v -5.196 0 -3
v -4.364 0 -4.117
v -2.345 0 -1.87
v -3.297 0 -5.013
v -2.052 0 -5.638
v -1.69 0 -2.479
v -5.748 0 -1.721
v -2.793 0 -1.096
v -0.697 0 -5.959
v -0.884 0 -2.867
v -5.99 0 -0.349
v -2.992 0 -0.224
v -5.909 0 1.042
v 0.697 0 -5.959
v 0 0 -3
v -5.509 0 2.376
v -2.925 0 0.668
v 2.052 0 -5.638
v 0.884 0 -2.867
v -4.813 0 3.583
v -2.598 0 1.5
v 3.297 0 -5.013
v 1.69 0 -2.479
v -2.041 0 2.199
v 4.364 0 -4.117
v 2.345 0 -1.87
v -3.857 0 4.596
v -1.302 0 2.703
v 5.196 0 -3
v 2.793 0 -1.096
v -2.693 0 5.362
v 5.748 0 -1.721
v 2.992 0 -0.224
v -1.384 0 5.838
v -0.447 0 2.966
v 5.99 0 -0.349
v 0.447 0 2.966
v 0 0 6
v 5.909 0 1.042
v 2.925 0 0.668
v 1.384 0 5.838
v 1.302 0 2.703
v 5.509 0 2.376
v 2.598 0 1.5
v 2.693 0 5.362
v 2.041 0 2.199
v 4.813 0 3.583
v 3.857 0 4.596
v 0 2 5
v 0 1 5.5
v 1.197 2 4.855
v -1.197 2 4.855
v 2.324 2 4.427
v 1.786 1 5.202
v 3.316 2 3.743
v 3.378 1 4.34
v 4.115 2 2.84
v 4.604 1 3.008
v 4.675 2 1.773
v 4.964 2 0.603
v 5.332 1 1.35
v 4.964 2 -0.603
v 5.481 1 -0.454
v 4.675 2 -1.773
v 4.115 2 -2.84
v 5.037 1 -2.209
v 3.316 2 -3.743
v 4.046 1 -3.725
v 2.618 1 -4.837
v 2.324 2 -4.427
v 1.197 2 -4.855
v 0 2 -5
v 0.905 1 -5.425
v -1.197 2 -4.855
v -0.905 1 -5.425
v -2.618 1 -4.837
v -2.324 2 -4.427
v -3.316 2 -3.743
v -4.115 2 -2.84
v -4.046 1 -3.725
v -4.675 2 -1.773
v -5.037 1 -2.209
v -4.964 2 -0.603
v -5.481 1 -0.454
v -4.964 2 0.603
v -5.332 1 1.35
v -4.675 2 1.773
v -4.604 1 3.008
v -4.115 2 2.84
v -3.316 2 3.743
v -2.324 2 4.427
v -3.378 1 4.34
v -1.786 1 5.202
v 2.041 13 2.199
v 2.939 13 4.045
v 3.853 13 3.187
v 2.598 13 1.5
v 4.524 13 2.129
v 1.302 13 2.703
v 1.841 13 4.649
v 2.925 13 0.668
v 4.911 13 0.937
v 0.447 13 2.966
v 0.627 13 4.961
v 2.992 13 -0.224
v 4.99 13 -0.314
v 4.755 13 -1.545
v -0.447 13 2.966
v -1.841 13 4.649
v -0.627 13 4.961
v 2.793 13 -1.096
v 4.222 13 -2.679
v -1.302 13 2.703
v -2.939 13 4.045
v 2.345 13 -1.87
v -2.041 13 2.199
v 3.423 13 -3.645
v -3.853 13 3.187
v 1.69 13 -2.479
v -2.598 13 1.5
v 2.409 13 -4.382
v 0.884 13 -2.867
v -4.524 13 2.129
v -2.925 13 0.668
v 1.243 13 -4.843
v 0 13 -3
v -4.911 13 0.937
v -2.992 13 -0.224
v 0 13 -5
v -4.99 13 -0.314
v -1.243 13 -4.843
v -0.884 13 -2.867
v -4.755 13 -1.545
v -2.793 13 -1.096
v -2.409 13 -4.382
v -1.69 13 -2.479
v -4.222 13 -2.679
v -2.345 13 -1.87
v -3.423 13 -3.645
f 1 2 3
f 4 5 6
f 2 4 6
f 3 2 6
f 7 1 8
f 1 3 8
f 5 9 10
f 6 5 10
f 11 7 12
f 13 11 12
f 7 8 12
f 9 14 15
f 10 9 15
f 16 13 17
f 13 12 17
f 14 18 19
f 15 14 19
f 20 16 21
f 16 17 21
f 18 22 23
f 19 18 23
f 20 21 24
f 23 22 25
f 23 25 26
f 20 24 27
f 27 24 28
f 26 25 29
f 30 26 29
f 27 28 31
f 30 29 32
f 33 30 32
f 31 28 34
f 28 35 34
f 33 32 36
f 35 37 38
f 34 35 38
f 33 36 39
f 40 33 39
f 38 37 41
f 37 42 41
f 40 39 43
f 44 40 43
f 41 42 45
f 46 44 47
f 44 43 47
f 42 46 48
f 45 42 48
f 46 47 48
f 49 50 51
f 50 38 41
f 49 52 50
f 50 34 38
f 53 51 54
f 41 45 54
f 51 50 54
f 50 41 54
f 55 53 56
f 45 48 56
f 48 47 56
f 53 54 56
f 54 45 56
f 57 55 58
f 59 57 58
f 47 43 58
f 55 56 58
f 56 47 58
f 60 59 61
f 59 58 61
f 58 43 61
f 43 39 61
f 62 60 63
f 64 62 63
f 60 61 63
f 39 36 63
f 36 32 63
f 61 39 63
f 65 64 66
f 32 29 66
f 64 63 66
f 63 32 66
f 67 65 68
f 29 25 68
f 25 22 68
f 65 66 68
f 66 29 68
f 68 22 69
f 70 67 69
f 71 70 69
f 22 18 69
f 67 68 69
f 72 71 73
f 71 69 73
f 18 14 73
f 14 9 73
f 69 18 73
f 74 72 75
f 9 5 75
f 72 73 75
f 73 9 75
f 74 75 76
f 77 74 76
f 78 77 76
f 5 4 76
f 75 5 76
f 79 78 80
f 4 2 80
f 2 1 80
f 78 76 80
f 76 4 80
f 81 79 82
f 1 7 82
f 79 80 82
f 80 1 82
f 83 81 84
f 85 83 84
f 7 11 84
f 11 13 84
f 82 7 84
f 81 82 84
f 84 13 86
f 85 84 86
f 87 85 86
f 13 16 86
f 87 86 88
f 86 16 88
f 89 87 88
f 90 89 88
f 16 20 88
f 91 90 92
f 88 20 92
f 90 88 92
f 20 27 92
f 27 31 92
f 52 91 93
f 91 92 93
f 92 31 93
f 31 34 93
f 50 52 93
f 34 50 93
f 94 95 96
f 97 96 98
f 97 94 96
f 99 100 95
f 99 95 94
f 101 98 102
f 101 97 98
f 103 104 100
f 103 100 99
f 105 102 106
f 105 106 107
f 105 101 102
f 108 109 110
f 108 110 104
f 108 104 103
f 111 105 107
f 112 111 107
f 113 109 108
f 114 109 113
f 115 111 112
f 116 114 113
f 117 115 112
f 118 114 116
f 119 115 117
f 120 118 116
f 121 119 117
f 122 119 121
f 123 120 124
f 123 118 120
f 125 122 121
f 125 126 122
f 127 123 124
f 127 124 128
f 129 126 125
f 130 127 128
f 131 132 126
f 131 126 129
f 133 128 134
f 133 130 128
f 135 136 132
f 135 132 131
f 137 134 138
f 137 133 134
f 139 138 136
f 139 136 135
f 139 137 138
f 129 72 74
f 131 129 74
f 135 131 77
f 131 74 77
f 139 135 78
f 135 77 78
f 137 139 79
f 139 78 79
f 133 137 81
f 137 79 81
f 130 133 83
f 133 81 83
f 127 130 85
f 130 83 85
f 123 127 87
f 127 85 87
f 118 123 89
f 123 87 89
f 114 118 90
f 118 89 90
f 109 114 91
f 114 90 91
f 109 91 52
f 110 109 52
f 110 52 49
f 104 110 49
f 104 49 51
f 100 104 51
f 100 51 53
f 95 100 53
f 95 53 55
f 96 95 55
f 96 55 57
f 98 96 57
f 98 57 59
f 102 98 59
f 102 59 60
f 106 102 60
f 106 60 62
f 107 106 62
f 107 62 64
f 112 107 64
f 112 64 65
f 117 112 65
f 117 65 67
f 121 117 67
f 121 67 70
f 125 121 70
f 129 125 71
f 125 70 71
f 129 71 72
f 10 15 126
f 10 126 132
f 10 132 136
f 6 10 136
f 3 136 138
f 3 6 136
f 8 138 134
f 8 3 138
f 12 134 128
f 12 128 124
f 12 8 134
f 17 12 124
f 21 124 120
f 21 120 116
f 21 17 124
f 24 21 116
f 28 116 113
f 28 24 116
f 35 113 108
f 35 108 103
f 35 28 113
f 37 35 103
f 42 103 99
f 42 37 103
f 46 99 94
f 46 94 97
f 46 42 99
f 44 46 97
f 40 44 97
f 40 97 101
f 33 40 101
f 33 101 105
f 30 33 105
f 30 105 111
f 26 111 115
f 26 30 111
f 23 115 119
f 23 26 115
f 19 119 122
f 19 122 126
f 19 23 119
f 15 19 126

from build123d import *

# Parameters (mm, degrees)
SKETCH_1_R       = 5
SKETCH_1_R_2     = 3
EXTRUDE_1_DEPTH  = 13
SKETCH_1_3_R     = 6
SKETCH_1_3_R_2   = 5
EXTRUDE_2_DEPTH  = 2
CHAMFER_1_SIZE   = 1
CHAMFER_1_SIZE_2 = 2


with BuildPart() as part:
    # 草图1 → 凸台-拉伸1 (new body)
    with BuildSketch(Plane(origin=(0, 0, 0), x_dir=(1, 0, 0), z_dir=(0, 1, 0))):
        with Locations(Location((0, 0, 0), (0, 0, 90))):
            Circle(SKETCH_1_R)
        with Locations(Location((0, 0, 0), (0, 0, 90))):
            Circle(SKETCH_1_R_2, mode=Mode.SUBTRACT)
    extrude(amount=EXTRUDE_1_DEPTH)

    # 草图1<3> → 凸台-拉伸2 (add)
    with BuildSketch(Plane(origin=(0, 0, 0), x_dir=(1, 0, 0), z_dir=(0, 1, 0))):
        with Locations(Location((0, 0, 0), (0, 0, 270))):
            Circle(SKETCH_1_3_R)
        with Locations(Location((0, 0, 0), (0, 0, 90))):
            Circle(SKETCH_1_3_R_2, mode=Mode.SUBTRACT)
    extrude(amount=EXTRUDE_2_DEPTH)

    # 倒角1
    # the kernel refuses this chamfer: 2, 1 mm, written as the material it takes off along each edge
    with BuildSketch(Plane(origin=(0, 2, 0), x_dir=(0, 0, 1), z_dir=(-1, 0, 0))) as chamfer_1_piece_1:
        Polygon((6 - CHAMFER_1_SIZE, 0), (6, -CHAMFER_1_SIZE_2), (6, 0), align=None)
    revolve(axis=Axis((0, 2, 0), (0, 1, 0)), mode=Mode.SUBTRACT)


solid = part.part
